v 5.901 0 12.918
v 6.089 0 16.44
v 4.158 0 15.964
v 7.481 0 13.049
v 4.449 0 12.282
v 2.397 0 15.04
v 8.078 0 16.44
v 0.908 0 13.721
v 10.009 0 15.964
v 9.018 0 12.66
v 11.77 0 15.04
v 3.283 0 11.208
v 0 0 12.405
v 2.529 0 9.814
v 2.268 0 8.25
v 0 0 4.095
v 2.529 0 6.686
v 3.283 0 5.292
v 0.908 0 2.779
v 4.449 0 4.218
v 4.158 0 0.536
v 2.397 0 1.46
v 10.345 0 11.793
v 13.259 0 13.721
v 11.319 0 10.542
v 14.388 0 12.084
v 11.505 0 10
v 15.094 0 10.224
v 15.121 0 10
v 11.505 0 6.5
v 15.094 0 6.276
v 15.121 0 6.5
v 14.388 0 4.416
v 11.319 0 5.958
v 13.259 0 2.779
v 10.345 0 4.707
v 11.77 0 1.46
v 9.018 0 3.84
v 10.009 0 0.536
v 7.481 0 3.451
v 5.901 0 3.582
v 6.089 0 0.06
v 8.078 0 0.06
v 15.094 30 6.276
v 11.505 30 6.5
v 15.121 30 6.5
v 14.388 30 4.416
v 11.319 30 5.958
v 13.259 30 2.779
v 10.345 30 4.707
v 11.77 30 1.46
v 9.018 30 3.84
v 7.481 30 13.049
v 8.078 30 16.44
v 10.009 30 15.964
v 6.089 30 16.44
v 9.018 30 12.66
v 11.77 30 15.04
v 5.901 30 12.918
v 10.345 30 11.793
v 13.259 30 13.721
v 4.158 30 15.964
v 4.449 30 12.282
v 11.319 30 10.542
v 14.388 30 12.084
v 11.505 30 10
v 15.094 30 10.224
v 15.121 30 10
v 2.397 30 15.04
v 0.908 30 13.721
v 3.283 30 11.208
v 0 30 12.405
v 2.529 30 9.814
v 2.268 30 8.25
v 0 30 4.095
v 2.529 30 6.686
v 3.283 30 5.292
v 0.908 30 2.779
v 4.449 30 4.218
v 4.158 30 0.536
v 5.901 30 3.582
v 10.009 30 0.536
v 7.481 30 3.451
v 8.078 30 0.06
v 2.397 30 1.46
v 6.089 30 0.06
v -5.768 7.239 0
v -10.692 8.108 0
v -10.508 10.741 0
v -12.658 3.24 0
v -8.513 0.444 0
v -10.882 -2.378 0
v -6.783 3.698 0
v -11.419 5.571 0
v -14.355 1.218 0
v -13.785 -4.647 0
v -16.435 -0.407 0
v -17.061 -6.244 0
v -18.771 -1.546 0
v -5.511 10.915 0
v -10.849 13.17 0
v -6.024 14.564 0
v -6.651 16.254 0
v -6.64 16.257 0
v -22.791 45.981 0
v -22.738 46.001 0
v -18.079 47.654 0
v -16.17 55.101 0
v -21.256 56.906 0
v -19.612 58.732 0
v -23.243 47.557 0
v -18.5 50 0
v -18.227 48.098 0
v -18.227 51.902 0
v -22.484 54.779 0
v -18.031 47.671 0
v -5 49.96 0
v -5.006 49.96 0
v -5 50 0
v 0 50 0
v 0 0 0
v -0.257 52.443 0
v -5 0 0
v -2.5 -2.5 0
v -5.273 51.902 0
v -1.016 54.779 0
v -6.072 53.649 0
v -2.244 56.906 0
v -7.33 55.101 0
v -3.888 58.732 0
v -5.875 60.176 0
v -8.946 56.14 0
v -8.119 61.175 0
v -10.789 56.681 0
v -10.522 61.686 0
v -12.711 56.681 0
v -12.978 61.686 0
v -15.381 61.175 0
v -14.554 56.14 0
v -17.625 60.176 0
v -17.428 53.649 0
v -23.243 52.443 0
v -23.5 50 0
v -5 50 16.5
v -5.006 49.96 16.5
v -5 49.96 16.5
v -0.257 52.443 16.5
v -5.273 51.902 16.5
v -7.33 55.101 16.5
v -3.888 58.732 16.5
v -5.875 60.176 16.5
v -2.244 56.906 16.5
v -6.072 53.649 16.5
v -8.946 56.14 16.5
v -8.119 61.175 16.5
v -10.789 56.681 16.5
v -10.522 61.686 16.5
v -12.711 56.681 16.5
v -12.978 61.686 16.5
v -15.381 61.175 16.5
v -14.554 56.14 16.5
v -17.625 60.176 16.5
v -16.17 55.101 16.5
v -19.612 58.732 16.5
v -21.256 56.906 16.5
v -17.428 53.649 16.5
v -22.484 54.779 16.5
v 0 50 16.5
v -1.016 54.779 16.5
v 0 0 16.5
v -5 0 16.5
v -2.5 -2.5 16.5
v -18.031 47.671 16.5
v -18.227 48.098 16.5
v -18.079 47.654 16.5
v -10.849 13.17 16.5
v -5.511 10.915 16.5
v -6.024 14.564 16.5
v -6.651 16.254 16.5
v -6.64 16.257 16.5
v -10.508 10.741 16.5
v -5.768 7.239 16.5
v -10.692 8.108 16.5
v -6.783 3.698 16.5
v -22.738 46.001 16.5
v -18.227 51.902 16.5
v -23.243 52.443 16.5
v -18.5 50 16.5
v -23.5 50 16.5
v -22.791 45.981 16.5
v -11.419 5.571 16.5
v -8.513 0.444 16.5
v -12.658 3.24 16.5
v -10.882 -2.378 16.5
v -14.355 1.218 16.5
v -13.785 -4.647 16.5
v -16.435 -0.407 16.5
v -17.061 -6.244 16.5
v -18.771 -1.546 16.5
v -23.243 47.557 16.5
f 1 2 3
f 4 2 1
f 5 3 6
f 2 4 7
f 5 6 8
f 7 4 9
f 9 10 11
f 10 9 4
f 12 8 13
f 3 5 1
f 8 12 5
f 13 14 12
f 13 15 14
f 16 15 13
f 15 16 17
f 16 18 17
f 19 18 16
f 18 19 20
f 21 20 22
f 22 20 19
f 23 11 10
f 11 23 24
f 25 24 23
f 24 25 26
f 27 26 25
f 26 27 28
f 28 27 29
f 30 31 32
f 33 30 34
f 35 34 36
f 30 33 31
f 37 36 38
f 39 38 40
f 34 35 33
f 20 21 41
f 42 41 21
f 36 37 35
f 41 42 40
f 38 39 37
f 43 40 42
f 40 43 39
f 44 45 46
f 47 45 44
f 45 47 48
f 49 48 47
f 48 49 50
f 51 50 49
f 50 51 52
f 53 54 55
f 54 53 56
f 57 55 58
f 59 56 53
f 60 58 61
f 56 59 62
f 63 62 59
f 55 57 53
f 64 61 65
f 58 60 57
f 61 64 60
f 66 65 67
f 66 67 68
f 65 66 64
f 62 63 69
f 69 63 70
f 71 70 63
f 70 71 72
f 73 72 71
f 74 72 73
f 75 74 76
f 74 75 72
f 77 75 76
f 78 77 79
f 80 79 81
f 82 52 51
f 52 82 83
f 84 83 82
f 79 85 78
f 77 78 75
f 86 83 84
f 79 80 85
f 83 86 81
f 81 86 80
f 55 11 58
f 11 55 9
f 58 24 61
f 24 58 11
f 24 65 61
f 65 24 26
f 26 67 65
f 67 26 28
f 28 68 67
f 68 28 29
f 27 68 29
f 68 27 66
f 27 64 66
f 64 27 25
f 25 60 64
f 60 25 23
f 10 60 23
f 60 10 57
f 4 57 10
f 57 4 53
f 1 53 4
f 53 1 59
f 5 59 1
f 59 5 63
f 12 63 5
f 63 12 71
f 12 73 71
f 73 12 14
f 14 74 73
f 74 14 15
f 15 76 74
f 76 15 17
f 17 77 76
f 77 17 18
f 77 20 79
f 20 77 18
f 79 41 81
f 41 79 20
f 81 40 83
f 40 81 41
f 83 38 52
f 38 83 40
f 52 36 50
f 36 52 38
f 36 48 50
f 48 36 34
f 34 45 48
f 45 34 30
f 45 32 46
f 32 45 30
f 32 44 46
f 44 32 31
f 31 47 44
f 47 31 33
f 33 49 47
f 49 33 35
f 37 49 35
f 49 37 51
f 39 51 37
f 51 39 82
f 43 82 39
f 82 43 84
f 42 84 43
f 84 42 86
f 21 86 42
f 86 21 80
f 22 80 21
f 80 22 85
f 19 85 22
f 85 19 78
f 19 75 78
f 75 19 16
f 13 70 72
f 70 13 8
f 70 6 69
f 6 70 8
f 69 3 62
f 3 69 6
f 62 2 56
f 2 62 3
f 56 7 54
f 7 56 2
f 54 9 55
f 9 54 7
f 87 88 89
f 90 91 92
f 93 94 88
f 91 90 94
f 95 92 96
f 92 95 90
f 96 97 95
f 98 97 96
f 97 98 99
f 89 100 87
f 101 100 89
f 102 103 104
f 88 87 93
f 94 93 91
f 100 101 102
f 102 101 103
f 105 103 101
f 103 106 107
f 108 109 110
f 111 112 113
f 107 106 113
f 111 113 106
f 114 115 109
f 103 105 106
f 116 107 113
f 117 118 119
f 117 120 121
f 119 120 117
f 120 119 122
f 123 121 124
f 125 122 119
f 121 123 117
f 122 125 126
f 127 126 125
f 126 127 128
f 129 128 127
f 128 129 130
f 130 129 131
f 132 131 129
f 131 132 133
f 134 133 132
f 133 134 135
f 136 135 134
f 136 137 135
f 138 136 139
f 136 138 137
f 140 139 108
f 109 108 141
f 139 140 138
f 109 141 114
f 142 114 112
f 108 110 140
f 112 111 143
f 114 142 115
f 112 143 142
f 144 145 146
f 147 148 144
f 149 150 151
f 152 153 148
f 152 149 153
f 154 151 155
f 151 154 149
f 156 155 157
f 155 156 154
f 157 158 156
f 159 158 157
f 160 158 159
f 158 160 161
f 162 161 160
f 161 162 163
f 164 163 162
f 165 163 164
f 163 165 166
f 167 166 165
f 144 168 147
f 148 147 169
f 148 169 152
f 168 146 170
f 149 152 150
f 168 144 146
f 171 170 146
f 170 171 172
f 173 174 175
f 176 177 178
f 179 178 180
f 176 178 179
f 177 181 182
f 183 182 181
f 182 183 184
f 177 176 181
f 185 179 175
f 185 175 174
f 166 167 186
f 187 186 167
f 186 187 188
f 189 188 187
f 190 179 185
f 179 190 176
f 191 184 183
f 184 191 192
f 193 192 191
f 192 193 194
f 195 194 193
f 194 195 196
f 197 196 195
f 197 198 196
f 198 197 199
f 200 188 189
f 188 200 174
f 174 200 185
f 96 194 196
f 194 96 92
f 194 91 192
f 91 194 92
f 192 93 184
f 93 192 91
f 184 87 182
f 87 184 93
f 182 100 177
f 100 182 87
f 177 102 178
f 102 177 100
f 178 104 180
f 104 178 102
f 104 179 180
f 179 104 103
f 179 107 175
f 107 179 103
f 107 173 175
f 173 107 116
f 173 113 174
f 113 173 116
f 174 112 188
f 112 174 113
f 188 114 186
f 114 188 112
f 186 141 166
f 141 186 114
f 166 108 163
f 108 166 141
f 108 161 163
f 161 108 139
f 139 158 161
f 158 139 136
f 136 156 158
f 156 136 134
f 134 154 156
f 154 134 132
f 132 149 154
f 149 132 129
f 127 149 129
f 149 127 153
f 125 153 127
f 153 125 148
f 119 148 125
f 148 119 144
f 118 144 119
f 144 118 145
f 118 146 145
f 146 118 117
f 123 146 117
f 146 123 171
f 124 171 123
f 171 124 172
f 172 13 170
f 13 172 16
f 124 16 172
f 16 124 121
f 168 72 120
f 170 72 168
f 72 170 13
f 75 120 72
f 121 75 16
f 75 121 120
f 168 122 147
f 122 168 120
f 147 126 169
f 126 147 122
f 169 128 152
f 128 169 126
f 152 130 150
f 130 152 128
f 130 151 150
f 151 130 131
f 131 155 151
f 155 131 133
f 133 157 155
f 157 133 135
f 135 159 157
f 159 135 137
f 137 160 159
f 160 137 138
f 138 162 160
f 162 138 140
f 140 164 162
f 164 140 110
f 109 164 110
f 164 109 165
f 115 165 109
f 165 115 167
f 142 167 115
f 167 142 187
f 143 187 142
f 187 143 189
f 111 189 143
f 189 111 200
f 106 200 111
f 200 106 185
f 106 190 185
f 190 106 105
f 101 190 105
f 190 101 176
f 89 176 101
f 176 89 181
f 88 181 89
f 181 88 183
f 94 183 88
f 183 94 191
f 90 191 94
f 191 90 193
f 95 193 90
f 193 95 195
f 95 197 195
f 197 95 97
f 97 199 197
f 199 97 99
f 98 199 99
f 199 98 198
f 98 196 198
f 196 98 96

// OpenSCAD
// Parts for wine/mead making siphon
// by Len Trigg <lenbok@gmail.com>


include<utils.scad>


tubeRad = 9.5 / 2;  // Radius of siphon tube. Measure this.

module siphoncap() {
    height = 15;   // Height of attachment: taller means less able to fully empty the flagon
    padding = 3;   // Width of space through which fluid can flow
    thickness = 1.4; // Thickness of printed walls

    innerRad = tubeRad + padding;
    outerRad = innerRad + thickness;

    difference() {
        cylinder(r = outerRad, h = height);
        difference() {
            translate([0, 0, thickness]) cylinder(r = tubeRad + padding, h = 20);
            for (r = [0, 120, 240]) {
                rotate([0,0,r]) {
                    translate([-thickness/2, -innerRad, thickness]) cube([thickness, innerRad, padding]);
                    translate([-thickness/2, -innerRad, thickness]) cube([thickness, padding, height]);
                }
            }
        }
    }
}

module siphonclip() {
    thickness = 3.5;
    clipthickness = 5;
    tubeheight = 30;
    clipheight = tubeheight +20;
    outerRad = tubeRad + thickness;
    clipRad = 6.75;
    clipOuterRad = clipRad + clipthickness;
    outerHeight = outerRad * 2;
    translate([tubeRad + thickness * 2 / 3, 0, outerRad]) rotate([-90,0,0]) linear_extrude(height = tubeheight) difference() {
        ring(r = outerRad, thickness = thickness);
        translate([0, -thickness/2, -fudge]) square([tubeRad * 2, thickness]);
    }
    linear_extrude(height=outerHeight) {
        translate([-clipthickness, 0]) square([clipthickness, clipheight]);
        translate([-clipthickness/2, 0]) circle(r=clipthickness/2,$fn=4);
        translate([-clipthickness-clipRad, clipheight]) difference() {
            wedge(r=clipRad+clipthickness, a=200);
            wedge(r=clipRad);
        }
        
        rotate([0,0,0]) translate([-clipOuterRad - clipRad * sin(70), clipheight - clipRad * cos(70)]) rotate([0,0,200]) square([clipthickness, clipheight - 15]); // The 15 here needs manual adjustment if you change other parameters

        translate([-clipthickness-tolerance-clipOuterRad*1.5, 10.3]) rotate([0,0,-70]) difference() { // The z of this translate needs manual adjustment
            wedge(r=clipOuterRad*1.5, a=90);
            wedge(r=clipOuterRad*1.5-clipthickness);
        }
}
}

siphonclip();
